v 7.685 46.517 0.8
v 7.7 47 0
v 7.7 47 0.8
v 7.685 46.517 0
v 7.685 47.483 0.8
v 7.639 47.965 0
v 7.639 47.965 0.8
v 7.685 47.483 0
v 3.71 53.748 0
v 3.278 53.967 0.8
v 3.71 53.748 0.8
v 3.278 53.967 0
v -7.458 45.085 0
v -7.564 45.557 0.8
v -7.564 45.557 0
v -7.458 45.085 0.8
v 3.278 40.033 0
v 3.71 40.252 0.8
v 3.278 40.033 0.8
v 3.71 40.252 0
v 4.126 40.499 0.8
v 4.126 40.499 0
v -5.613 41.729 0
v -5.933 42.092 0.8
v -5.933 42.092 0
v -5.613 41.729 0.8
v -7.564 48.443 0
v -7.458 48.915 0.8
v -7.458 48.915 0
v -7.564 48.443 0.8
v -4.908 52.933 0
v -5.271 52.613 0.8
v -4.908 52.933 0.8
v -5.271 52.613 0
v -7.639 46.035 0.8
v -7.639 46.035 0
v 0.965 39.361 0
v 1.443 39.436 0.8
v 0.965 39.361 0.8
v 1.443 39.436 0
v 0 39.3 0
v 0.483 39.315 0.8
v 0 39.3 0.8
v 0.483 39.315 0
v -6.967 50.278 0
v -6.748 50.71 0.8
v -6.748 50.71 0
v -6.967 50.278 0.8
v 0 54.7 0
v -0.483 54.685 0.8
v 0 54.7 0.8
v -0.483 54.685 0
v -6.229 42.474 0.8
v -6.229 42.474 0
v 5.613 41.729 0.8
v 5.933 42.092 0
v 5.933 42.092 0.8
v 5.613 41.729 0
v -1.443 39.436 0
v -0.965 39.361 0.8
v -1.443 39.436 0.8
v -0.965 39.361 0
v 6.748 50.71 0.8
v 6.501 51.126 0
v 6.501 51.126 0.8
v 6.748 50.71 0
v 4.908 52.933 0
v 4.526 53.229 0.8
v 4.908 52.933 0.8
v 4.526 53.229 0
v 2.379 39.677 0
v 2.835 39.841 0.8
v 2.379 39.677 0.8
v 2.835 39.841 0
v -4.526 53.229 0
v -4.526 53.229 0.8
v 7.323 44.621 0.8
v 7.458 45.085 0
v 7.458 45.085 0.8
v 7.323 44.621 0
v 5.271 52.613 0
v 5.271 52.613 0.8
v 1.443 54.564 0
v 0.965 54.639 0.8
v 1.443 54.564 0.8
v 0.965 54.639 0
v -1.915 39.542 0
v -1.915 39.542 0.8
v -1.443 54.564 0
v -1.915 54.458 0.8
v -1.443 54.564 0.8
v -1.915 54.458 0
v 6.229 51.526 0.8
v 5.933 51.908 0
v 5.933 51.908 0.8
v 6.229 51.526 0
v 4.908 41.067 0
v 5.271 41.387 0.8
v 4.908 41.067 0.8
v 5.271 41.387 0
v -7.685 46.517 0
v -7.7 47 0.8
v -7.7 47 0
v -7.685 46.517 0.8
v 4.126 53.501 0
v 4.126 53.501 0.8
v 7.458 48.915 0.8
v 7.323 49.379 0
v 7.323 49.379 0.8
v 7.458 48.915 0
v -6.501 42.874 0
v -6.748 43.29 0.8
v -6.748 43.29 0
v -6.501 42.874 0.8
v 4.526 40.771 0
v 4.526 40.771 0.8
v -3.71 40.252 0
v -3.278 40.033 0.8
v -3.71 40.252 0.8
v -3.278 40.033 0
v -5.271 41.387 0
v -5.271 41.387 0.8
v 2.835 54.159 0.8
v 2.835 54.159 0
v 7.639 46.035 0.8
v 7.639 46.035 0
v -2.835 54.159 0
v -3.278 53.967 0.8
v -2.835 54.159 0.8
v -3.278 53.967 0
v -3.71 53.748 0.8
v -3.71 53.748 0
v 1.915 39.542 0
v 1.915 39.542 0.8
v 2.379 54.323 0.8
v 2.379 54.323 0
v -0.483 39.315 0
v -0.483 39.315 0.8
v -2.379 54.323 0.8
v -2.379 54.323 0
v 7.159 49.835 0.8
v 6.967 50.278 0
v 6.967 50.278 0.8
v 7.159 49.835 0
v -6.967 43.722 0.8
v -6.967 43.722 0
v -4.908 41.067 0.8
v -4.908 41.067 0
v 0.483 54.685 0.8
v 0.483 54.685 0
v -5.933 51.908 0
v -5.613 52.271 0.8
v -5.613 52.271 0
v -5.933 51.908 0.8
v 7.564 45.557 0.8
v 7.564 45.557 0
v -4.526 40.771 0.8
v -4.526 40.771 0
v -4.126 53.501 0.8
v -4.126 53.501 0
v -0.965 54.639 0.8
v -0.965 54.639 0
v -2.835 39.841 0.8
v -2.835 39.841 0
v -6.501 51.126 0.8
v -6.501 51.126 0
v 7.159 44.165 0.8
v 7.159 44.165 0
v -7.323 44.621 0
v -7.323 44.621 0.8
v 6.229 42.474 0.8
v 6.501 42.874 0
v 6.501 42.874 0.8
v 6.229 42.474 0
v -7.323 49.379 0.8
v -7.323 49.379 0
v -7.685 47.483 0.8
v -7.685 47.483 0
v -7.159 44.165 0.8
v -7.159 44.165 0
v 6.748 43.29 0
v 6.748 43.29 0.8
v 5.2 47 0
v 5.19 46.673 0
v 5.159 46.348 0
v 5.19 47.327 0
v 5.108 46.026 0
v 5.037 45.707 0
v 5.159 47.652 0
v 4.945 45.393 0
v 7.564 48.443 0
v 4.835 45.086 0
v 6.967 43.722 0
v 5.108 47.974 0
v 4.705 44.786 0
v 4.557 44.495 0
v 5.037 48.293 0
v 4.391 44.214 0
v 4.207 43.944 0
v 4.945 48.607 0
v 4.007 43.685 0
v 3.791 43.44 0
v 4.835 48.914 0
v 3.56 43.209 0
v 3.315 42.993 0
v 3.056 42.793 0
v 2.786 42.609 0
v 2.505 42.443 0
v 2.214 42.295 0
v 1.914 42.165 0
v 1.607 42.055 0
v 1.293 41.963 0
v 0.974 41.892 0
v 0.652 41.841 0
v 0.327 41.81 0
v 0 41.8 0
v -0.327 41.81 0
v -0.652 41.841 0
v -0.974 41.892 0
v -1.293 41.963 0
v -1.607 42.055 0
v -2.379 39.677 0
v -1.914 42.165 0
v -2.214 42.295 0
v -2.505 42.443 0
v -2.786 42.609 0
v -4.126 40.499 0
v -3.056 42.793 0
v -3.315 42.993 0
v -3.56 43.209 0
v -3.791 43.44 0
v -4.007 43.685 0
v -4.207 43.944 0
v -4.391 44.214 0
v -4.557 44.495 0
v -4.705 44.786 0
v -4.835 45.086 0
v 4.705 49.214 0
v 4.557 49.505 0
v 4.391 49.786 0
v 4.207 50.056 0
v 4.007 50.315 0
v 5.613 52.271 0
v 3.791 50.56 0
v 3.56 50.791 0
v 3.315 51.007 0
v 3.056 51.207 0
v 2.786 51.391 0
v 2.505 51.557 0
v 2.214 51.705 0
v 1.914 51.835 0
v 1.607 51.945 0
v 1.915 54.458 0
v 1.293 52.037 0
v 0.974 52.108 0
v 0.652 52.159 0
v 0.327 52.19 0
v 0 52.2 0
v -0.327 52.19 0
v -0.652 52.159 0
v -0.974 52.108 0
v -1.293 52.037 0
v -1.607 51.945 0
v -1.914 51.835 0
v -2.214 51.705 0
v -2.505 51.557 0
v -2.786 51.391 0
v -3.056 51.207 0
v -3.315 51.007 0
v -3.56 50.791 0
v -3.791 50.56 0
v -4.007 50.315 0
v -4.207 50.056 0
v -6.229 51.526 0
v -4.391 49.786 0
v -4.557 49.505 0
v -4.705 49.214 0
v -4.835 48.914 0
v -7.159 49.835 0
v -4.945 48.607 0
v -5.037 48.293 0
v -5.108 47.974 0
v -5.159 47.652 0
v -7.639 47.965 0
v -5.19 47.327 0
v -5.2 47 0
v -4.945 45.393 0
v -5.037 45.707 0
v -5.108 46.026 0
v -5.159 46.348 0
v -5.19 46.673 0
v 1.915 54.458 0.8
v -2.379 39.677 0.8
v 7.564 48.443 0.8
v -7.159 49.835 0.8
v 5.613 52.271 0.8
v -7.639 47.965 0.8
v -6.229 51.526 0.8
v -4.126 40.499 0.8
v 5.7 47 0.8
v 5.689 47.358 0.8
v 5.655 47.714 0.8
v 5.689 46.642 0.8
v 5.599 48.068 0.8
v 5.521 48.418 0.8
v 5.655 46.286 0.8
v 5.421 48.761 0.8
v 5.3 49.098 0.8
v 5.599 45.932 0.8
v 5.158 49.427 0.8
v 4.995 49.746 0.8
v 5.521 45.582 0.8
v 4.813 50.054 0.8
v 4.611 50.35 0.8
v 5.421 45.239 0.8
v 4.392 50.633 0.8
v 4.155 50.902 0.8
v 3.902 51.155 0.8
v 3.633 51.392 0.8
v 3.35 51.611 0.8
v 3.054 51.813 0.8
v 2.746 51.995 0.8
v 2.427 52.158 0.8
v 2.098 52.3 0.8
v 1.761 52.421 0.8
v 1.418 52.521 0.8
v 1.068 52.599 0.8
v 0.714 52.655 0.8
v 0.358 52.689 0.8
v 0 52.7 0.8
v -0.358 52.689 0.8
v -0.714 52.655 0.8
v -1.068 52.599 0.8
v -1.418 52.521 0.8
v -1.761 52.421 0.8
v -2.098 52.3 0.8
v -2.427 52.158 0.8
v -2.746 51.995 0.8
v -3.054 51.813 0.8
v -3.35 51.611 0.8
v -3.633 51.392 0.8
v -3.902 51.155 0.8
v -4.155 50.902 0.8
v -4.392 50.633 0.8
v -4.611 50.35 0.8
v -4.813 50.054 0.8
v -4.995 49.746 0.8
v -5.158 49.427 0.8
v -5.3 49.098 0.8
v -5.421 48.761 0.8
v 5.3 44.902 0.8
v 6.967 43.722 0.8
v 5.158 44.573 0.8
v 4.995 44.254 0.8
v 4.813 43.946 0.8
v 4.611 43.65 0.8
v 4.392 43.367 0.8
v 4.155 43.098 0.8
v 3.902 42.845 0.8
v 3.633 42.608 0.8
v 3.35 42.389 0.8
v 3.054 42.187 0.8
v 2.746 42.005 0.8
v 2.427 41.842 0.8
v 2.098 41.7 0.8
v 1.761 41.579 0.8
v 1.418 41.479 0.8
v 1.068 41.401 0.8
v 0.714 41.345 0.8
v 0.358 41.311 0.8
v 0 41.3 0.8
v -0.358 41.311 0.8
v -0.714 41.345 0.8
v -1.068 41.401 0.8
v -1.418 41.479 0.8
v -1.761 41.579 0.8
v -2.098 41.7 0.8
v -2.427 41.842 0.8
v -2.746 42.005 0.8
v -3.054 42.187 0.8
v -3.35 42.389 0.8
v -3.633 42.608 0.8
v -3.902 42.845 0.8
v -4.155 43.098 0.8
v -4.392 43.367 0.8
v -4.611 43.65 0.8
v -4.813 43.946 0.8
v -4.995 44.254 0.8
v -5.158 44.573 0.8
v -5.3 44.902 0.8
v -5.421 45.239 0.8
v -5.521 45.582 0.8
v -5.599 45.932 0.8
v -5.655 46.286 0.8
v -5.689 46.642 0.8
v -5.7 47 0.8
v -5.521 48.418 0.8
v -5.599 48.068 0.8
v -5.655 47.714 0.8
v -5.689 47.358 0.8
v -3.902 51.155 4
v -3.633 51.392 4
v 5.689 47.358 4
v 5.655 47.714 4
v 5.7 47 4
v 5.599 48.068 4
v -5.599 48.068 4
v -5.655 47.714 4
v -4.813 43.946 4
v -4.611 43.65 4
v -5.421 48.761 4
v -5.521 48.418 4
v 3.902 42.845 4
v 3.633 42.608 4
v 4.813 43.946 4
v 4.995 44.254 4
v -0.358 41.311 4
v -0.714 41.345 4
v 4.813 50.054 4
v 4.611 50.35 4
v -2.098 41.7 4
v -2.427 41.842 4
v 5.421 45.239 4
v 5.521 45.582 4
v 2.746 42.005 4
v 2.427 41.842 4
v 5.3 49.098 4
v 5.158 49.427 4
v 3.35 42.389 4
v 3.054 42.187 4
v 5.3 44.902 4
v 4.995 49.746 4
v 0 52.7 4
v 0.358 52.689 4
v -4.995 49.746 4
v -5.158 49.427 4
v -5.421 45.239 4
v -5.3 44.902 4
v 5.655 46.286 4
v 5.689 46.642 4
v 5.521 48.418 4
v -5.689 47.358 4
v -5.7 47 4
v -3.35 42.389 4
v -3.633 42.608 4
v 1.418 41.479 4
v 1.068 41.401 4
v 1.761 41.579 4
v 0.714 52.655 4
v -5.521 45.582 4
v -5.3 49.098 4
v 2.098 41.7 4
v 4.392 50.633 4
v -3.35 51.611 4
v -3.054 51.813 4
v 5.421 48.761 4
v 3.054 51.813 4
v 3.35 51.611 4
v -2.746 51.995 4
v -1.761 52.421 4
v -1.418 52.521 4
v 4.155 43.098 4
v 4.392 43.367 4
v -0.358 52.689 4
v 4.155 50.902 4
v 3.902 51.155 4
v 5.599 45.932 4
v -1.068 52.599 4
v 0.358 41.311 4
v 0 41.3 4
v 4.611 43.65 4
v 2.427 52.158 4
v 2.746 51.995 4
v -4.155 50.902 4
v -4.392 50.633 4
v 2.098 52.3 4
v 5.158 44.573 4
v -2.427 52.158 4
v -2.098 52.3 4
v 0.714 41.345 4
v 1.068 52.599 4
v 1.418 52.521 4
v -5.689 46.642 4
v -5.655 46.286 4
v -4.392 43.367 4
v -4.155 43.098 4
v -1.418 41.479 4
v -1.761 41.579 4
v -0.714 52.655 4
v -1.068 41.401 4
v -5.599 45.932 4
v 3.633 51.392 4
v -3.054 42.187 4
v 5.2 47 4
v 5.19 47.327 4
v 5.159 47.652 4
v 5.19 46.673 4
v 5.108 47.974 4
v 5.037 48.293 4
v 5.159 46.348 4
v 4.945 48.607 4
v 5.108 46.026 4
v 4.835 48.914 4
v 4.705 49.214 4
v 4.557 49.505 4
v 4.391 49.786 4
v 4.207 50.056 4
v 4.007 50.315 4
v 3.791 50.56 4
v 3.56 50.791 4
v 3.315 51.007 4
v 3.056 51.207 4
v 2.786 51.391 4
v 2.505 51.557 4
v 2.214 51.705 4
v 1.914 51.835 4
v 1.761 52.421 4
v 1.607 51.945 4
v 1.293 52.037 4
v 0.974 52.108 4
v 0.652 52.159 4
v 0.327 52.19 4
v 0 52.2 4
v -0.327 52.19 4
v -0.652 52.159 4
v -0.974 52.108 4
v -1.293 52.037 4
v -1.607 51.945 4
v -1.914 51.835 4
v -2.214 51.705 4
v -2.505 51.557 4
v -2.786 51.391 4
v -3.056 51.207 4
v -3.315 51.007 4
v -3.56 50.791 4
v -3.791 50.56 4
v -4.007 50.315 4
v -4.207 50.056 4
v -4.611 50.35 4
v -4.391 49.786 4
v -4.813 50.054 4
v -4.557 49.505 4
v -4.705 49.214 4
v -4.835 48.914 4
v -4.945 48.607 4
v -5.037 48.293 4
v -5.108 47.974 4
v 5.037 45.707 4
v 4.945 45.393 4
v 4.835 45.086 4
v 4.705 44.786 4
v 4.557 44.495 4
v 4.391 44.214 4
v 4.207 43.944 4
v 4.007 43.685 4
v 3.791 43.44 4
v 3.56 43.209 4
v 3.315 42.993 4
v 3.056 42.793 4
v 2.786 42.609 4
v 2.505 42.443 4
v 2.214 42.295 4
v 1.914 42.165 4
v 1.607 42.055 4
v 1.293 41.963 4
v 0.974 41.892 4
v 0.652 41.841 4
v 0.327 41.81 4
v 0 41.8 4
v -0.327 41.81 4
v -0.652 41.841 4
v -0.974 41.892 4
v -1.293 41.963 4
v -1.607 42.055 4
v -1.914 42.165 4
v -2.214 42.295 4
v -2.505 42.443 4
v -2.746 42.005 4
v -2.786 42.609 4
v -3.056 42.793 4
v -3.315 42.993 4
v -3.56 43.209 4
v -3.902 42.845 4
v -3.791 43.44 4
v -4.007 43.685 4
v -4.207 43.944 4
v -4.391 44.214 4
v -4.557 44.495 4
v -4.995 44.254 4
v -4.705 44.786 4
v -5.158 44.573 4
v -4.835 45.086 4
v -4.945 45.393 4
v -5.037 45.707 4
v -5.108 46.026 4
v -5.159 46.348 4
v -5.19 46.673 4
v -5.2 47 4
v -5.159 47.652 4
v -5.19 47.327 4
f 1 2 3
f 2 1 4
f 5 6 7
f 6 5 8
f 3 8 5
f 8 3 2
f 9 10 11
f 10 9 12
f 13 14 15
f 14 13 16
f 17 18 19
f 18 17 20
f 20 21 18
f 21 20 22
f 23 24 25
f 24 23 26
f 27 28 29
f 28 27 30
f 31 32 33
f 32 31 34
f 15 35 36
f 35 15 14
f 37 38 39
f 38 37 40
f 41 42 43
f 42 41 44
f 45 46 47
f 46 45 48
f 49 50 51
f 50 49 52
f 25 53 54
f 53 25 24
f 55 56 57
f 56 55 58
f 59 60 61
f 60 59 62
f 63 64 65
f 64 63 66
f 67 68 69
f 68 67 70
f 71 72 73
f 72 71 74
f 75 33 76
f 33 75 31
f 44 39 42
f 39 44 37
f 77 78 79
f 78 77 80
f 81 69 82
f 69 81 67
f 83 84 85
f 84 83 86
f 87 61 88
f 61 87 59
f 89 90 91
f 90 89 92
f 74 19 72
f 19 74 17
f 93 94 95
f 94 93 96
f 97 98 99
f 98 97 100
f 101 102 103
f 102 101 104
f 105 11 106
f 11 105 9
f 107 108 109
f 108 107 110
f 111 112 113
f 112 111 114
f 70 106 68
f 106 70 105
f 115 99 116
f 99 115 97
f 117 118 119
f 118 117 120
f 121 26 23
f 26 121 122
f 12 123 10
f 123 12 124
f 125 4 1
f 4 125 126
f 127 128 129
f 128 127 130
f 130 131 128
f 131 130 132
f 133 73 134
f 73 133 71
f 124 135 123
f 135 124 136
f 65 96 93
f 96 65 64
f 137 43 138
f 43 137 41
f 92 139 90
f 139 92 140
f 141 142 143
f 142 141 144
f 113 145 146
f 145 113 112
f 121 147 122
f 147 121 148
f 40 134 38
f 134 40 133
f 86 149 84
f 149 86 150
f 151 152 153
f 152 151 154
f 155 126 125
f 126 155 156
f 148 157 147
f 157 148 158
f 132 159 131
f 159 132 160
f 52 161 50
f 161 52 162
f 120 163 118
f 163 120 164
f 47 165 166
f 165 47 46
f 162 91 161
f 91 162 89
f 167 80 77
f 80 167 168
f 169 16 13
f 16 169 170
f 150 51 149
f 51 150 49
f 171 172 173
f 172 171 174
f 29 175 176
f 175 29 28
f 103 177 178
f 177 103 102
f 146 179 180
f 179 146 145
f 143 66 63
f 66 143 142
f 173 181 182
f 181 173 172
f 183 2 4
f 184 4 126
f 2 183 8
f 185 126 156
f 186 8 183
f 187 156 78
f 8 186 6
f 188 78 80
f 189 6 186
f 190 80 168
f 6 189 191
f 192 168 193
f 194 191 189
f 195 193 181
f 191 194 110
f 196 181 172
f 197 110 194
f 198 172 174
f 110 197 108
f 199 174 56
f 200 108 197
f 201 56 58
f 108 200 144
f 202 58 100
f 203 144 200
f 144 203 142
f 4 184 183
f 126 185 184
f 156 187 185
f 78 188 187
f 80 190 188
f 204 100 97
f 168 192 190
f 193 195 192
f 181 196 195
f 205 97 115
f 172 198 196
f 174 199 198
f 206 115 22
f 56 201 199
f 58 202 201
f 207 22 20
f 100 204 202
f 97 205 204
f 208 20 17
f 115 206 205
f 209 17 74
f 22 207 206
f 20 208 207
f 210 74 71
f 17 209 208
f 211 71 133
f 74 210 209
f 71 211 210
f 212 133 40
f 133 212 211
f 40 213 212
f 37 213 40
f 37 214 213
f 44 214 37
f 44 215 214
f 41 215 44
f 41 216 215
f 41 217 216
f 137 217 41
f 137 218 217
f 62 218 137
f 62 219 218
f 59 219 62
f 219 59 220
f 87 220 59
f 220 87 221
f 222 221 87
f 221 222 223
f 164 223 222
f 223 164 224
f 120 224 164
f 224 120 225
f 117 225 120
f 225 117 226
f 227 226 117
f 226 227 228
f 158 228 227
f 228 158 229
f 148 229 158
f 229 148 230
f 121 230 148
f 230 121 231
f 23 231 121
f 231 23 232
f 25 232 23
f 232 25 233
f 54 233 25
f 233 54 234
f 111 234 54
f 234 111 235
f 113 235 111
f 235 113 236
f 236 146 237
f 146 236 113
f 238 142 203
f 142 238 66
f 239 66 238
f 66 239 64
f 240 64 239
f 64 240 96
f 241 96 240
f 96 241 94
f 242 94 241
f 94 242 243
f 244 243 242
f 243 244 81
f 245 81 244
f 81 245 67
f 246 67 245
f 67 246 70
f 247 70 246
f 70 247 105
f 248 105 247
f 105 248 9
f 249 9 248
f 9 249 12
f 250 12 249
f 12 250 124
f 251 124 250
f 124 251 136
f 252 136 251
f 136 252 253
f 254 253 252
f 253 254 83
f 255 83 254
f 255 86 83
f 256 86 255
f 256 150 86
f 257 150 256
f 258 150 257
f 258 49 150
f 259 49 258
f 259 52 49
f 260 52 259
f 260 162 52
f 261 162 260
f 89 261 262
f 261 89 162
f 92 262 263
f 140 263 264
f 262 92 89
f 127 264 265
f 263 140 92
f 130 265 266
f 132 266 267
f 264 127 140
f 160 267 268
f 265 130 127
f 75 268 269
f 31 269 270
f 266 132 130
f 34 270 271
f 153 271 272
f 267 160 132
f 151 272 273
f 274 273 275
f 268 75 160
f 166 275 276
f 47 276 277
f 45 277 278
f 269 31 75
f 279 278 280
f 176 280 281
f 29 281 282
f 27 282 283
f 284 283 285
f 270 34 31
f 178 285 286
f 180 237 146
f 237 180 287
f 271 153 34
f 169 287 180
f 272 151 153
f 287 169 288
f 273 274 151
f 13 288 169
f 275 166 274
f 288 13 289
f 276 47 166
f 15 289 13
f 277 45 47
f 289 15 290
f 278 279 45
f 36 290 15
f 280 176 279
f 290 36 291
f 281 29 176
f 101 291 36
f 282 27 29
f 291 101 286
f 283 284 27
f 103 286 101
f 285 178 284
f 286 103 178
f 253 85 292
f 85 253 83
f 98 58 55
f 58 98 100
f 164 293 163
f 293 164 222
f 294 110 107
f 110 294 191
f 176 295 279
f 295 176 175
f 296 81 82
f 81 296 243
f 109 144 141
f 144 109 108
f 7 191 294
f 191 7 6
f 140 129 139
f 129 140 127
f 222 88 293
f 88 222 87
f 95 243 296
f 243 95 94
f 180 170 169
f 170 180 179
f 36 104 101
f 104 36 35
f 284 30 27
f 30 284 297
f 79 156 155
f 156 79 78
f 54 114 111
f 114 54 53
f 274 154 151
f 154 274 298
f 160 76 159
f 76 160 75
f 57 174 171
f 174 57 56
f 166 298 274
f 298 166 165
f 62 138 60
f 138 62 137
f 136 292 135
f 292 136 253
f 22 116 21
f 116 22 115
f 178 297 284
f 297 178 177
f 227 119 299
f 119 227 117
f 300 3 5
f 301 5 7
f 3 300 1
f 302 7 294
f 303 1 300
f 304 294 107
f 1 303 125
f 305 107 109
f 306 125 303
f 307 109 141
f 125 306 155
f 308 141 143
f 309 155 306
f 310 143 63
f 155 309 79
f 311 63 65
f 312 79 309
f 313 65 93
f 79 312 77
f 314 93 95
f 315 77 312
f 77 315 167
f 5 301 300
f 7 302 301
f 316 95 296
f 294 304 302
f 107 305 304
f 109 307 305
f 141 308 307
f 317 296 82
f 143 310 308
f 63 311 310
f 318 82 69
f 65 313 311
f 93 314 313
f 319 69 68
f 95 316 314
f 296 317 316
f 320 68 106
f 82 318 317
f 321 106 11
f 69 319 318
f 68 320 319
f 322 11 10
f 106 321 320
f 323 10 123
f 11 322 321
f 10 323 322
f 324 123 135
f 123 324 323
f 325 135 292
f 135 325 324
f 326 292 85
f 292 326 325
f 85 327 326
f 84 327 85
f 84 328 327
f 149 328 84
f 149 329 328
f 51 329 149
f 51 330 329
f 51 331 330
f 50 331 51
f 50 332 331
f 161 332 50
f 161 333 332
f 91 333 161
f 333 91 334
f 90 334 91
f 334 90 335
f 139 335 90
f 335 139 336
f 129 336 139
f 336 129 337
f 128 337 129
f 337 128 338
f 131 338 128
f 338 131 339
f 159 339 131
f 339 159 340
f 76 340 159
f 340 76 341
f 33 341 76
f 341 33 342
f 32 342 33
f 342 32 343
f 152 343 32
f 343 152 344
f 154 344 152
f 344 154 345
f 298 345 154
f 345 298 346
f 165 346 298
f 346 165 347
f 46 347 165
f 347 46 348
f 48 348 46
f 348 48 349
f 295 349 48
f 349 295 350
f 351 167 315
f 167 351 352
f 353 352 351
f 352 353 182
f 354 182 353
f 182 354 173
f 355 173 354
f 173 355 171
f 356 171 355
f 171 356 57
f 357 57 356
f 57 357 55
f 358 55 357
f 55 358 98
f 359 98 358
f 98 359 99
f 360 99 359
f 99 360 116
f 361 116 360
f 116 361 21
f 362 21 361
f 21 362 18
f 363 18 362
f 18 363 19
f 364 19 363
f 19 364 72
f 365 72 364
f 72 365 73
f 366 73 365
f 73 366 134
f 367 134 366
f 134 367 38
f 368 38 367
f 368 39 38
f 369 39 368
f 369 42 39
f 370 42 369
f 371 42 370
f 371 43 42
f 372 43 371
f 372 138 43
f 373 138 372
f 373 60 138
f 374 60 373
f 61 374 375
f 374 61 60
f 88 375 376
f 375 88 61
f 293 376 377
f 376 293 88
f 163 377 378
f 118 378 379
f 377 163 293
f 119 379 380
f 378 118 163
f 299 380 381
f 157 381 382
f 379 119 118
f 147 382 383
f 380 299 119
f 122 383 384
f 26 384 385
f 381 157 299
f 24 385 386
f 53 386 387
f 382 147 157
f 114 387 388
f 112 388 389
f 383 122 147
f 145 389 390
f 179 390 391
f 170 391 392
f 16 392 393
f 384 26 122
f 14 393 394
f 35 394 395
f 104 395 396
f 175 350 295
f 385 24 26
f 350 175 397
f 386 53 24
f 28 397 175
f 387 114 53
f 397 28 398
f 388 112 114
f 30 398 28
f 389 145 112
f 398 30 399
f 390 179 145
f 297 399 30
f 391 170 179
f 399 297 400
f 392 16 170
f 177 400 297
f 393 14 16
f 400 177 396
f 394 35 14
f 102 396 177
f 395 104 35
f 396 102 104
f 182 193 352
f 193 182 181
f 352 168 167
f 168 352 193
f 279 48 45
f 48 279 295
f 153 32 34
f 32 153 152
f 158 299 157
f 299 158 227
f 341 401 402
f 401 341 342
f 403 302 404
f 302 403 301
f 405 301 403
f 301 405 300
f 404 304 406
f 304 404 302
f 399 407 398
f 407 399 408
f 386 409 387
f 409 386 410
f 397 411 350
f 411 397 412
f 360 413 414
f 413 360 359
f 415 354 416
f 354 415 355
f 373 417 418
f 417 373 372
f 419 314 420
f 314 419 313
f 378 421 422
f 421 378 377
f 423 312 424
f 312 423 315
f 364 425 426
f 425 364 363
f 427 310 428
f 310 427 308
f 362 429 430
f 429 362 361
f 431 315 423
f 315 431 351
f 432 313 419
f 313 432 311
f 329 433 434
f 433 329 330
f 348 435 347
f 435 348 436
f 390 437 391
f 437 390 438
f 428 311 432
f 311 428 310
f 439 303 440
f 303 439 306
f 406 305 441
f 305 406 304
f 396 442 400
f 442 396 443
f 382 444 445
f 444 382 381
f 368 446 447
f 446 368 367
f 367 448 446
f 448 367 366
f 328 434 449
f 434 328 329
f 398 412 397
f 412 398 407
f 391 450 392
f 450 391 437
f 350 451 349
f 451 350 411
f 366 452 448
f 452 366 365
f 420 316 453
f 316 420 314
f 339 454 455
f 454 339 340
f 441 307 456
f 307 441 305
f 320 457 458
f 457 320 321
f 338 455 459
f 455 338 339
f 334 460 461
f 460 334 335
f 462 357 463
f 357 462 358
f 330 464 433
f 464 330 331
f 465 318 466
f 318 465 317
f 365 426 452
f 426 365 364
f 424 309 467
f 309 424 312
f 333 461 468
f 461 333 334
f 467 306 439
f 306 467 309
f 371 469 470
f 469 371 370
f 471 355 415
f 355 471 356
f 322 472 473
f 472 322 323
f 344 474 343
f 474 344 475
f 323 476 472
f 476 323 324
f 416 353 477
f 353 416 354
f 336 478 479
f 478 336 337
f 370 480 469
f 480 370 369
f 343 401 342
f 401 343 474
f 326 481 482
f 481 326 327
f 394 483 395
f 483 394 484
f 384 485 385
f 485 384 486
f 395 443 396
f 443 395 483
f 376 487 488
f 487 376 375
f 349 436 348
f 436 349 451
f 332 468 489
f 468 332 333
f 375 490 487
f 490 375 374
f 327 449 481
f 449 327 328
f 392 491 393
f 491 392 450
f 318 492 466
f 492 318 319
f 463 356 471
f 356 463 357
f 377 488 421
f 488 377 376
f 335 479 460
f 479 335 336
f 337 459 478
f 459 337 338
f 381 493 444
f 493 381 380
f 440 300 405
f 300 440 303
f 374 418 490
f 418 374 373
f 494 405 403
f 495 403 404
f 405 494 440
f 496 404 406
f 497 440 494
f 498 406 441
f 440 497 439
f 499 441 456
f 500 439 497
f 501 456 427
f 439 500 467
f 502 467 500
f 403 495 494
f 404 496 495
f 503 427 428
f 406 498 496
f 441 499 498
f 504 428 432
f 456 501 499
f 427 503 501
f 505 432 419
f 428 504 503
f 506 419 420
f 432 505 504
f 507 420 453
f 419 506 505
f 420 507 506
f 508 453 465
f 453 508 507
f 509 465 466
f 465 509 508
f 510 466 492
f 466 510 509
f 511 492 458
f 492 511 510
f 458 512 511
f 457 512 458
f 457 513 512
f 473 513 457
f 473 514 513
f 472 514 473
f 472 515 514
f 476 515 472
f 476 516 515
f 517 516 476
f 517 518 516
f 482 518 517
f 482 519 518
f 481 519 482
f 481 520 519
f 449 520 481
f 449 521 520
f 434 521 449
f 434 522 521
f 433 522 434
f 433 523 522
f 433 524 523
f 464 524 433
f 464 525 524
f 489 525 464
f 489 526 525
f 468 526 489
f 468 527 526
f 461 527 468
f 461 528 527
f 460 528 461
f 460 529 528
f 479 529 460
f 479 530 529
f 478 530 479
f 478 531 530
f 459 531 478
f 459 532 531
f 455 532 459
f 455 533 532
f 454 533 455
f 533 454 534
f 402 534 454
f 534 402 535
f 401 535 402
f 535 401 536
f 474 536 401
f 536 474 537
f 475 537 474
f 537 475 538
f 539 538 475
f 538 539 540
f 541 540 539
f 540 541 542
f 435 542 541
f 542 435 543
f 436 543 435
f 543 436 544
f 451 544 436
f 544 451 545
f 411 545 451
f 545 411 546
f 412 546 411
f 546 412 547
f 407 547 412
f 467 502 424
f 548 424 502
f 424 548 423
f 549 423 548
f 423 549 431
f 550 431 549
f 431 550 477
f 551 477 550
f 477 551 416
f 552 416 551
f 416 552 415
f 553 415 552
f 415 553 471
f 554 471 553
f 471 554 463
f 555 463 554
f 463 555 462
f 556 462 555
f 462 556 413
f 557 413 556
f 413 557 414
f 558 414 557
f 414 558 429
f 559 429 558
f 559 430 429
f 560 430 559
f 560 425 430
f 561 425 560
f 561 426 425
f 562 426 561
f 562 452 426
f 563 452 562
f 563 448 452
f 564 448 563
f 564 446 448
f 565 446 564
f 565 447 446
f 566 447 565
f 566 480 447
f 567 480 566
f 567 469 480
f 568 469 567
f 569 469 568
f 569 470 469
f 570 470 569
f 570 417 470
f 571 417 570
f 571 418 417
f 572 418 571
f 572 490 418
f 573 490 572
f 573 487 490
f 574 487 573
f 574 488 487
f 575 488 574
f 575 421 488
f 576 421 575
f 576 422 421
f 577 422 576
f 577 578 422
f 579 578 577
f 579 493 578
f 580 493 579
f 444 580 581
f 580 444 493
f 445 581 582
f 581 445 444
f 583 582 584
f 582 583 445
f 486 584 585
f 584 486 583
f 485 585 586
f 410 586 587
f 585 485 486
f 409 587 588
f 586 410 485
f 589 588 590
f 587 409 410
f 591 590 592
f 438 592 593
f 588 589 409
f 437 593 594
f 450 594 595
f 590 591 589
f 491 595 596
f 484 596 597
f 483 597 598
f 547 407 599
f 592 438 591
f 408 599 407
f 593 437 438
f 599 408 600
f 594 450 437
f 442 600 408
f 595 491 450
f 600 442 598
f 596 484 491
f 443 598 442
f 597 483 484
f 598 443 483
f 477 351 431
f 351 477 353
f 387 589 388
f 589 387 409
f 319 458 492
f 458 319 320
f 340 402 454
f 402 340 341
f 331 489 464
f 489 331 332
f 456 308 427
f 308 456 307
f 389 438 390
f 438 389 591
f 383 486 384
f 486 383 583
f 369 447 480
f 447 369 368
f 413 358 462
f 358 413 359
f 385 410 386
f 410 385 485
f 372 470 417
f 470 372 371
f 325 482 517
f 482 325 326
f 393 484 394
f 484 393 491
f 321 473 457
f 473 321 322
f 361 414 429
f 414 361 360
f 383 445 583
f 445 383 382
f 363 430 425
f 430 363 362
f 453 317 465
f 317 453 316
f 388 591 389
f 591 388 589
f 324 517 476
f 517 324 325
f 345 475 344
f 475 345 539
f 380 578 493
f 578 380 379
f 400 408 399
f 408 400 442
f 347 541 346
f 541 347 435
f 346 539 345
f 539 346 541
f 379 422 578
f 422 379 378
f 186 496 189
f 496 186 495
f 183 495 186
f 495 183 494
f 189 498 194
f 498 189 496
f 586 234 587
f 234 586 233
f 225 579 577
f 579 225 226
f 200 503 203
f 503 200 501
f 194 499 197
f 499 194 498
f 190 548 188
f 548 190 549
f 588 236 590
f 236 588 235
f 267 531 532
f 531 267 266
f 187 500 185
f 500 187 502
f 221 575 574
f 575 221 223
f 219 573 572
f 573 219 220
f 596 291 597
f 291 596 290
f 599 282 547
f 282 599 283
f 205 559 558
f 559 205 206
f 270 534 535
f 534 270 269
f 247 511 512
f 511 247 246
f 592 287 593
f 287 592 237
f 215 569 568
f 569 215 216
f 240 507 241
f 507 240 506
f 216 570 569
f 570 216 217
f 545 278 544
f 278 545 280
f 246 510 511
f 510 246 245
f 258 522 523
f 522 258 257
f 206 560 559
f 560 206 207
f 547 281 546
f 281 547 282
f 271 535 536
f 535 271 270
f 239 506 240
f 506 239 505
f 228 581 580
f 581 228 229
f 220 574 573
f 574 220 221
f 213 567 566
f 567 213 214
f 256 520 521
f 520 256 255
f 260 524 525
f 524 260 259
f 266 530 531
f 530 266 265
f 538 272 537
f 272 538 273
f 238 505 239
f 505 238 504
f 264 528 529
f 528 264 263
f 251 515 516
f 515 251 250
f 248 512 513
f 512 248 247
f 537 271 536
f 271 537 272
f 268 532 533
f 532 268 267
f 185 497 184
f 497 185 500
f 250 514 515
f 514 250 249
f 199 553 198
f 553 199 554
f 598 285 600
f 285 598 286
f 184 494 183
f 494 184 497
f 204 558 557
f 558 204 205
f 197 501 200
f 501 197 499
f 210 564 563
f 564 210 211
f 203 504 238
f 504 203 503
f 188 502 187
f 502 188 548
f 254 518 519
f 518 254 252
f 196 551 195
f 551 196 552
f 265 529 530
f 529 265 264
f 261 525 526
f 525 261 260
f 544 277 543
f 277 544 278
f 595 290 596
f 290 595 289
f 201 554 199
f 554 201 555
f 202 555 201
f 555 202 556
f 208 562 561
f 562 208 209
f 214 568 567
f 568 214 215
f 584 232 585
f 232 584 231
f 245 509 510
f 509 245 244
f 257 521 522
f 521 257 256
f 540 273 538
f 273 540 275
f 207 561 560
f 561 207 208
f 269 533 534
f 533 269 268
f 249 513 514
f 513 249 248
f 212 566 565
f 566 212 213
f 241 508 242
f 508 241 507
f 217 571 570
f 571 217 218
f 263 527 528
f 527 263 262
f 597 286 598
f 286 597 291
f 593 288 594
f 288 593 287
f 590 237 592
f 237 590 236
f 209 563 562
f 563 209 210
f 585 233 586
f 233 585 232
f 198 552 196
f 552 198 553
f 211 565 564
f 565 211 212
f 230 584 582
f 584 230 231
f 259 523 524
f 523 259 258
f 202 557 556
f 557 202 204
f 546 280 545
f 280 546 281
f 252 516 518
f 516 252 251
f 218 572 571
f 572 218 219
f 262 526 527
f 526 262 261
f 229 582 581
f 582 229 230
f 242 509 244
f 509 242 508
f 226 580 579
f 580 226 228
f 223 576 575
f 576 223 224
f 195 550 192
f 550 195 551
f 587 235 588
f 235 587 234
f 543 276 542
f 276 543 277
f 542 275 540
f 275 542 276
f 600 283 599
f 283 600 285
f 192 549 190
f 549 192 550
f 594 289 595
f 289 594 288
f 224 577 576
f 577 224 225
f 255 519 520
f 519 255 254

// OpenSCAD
cylinder_thickness = 0.5;
flange_height = 2;
flange_width = 0.8;
diameter = 10.2+0.2;
bearing_width = 4;
bearing_diameter = 10;
margin = 0.2;
roller_diameter_big = 21;
roller_diameter_small = 15;
roller_width_big = 1.5;
roller_width_small = 4.25;
axis_diameter = 8;


$fn=100;
rounded = false;

module oring(dia, fi) {
	rotate_extrude(convexity = 10)
	translate([dia/2+fi/2, 0, 0])
	circle(r = fi/2);
}

module flansza() {
difference () {
	union() {
		cylinder (d=diameter + 2*flange_height + 2*cylinder_thickness, h=flange_width);
		if (rounded) {
			translate ([0,0,bearing_width-cylinder_thickness])oring(diameter, cylinder_thickness);
			cylinder (d=diameter + 2*cylinder_thickness, h=bearing_width-cylinder_thickness);
		}
		else {
			cylinder (d=diameter + 2*cylinder_thickness, h=bearing_width);
		}
	}
	cylinder (d=diameter, h= bearing_width);
}
}






for (i = [0:0]) {//0:17
	rotate ([0,0,360/18*i]) translate ([0,47,0]) flansza();
}

//translate ([0,0,2*bearing_width]) mirror ([0,0,1]) half();

module sroller() {
	difference () {
		union () {
			cylinder (d=roller_diameter_big, h= roller_width_big);
			translate ([0,0,roller_width_big]) cylinder (d=roller_diameter_small, h= roller_width_small);
		}
		cylinder (d=axis_diameter, h=roller_width_big+roller_width_small);
		translate ([0,0,roller_width_big+roller_width_small - bearing_width]) cylinder (d=bearing_diameter+margin, h=bearing_width);
	}
}

//sroller();
